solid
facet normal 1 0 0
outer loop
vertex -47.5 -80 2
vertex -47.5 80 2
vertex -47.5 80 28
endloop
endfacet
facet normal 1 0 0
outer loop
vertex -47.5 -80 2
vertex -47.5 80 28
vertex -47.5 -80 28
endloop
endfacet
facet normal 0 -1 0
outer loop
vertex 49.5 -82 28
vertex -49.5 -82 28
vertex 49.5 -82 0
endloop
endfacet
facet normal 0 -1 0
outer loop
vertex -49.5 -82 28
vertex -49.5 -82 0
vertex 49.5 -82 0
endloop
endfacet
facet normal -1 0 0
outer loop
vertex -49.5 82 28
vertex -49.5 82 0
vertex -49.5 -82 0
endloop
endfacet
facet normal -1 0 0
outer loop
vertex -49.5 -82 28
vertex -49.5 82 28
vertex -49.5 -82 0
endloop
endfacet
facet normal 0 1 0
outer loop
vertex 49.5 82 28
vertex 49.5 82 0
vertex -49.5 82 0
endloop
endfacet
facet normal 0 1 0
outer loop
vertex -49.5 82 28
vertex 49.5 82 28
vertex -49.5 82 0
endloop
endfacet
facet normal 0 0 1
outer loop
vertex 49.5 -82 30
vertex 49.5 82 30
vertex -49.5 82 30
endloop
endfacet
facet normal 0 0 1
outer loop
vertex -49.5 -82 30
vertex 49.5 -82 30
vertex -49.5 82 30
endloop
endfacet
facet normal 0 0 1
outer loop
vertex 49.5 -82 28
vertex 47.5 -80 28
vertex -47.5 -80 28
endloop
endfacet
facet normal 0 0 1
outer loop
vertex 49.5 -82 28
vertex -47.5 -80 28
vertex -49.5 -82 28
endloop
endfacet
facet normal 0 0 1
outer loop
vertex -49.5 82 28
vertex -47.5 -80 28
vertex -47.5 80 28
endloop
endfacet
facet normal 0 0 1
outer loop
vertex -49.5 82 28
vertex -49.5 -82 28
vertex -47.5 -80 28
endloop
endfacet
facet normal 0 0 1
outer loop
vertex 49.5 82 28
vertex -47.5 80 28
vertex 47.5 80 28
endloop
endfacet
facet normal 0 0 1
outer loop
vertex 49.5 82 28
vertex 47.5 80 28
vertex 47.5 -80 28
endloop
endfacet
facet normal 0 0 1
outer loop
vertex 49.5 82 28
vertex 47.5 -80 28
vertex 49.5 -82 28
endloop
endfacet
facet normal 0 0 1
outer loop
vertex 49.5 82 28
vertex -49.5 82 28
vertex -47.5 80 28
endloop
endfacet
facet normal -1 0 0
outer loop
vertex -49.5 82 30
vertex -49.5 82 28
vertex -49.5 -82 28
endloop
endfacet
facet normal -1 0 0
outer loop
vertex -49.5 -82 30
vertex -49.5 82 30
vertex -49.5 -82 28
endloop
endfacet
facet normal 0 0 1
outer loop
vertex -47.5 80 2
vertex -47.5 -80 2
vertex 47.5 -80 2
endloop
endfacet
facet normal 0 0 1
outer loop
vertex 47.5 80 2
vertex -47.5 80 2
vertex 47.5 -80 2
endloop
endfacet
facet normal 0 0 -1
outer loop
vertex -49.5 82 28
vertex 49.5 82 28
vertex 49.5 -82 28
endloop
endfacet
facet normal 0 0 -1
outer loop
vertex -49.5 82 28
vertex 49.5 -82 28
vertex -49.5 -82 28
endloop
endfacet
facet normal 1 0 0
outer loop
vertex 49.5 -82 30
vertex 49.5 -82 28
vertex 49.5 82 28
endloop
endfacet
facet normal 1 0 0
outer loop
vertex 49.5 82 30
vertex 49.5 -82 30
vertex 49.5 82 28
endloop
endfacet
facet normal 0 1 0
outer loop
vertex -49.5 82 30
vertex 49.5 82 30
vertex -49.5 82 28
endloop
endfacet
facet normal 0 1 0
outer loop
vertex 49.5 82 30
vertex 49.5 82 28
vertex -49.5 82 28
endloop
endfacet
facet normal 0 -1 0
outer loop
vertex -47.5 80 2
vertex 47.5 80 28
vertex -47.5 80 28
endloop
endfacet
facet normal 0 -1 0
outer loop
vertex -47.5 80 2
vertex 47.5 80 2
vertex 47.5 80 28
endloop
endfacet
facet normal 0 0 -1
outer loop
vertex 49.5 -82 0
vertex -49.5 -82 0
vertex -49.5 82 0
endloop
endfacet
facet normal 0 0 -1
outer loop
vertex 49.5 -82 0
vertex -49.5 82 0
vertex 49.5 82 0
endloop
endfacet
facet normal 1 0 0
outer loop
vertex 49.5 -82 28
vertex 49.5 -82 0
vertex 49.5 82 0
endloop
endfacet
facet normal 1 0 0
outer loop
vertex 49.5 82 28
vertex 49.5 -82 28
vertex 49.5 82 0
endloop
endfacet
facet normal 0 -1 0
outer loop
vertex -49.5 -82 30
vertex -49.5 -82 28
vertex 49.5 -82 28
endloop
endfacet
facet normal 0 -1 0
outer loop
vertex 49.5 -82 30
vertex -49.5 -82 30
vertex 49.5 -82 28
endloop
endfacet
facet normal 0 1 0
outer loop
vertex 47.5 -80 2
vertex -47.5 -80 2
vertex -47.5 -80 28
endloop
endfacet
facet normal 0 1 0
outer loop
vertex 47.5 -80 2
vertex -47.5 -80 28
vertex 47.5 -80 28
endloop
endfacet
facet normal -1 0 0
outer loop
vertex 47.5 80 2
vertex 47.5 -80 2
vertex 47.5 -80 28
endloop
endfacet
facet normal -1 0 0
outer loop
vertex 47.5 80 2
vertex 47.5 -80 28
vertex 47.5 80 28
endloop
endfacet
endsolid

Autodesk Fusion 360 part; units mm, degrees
sketch "Sketch1" plane through (0, 0, 0) normal (0, 0, 1) x (1, 0, 0)
  line L0 (47.5, 80) -> (-47.5, 80)
  line L1 (-47.5, 80) -> (-47.5, -80)
  line L2 (-47.5, -80) -> (47.5, -80)
  line L3 (47.5, -80) -> (47.5, 80)
  line L4 (47.5, 80) -> (-47.5, -80) construction
  line L5 (-47.5, 80) -> (47.5, -80) construction
  line L6 (-49.5, -82) -> (49.5, -82)
  line L7 (49.5, -82) -> (49.5, 82)
  line L8 (49.5, 82) -> (-49.5, 82)
  line L9 (-49.5, 82) -> (-49.5, -82)
  dimension "d1" = 95
  dimension "d2" = 160
  dimension "d3" = 2
extrude "Extrude1" add sketch "Sketch1" along normal blind 28 makes body 1
sketch "Sketch2" plane through (0, 0, 0) normal (0, 0, 1) x (1, 0, 0)
  line L0 (47.5, 80) -> (47.5, -80)
  line L1 (47.5, 80) -> (47.5, -80)
  line L2 (47.5, -80) -> (-47.5, -80)
  line L3 (-47.5, -80) -> (-47.5, 80)
  line L4 (-47.5, 80) -> (47.5, 80)
  line L5 (-49.5, 82) -> (-49.5, -82)
  line L6 (-49.5, -82) -> (49.5, -82)
  line L7 (49.5, -82) -> (49.5, 82)
  line L8 (49.5, 82) -> (-49.5, 82)
  line L9 (-47.5, 80) -> (47.5, 80)
  line L10 (47.5, 80) -> (47.5, -80)
  line L11 (47.5, -80) -> (-47.5, -80)
  line L12 (-47.5, -80) -> (-47.5, 80)
extrude "Extrude2" add sketch "Sketch2" along normal blind 2 contours L0 L1 L2 L3 L4 L9 L10 L11 L12 bodies 1
copy_body "Body->Comp1" bodies 1 removing the originals makes body 2 in component "Bottom Case"
sketch "Sketch3" plane through (0, 0, 28) normal (0, 0, 1) x (-1, 0, 0)
  line L0 (-47.5, -80) -> (-47.5, 80)
  line L1 (-47.5, 80) -> (47.5, 80)
  line L2 (47.5, 80) -> (47.5, -80)
  line L3 (47.5, -80) -> (-47.5, -80)
  line L4 (49.5, -82) -> (49.5, 82)
  line L5 (49.5, 82) -> (-49.5, 82)
  line L6 (-49.5, 82) -> (-49.5, -82)
  line L7 (-49.5, -82) -> (49.5, -82)
  line L8 (-49.5, 82) -> (49.5, 82)
  line L9 (49.5, 82) -> (49.5, -82)
  line L10 (49.5, -82) -> (-49.5, -82)
  line L11 (-49.5, -82) -> (-49.5, 82)
extrude "Extrude1'" add sketch "Sketch3" along normal blind 2 separate body contours L0 L1 L2 L3 | L4 L5 L6 L7 L8 L9 L10 L11 makes body 3 in component "Top Case"
component "Bottom Case" placed x (1, 0, 0) y (0, 1, 0) z (0, 0, 1) at (0, 0, 0)
component "Top Case" placed x (1, 0, 0) y (0, 1, 0) z (0, 0, 1) at (0, 0, 0)
equation "d4 = 30 mm - 2 mm"
